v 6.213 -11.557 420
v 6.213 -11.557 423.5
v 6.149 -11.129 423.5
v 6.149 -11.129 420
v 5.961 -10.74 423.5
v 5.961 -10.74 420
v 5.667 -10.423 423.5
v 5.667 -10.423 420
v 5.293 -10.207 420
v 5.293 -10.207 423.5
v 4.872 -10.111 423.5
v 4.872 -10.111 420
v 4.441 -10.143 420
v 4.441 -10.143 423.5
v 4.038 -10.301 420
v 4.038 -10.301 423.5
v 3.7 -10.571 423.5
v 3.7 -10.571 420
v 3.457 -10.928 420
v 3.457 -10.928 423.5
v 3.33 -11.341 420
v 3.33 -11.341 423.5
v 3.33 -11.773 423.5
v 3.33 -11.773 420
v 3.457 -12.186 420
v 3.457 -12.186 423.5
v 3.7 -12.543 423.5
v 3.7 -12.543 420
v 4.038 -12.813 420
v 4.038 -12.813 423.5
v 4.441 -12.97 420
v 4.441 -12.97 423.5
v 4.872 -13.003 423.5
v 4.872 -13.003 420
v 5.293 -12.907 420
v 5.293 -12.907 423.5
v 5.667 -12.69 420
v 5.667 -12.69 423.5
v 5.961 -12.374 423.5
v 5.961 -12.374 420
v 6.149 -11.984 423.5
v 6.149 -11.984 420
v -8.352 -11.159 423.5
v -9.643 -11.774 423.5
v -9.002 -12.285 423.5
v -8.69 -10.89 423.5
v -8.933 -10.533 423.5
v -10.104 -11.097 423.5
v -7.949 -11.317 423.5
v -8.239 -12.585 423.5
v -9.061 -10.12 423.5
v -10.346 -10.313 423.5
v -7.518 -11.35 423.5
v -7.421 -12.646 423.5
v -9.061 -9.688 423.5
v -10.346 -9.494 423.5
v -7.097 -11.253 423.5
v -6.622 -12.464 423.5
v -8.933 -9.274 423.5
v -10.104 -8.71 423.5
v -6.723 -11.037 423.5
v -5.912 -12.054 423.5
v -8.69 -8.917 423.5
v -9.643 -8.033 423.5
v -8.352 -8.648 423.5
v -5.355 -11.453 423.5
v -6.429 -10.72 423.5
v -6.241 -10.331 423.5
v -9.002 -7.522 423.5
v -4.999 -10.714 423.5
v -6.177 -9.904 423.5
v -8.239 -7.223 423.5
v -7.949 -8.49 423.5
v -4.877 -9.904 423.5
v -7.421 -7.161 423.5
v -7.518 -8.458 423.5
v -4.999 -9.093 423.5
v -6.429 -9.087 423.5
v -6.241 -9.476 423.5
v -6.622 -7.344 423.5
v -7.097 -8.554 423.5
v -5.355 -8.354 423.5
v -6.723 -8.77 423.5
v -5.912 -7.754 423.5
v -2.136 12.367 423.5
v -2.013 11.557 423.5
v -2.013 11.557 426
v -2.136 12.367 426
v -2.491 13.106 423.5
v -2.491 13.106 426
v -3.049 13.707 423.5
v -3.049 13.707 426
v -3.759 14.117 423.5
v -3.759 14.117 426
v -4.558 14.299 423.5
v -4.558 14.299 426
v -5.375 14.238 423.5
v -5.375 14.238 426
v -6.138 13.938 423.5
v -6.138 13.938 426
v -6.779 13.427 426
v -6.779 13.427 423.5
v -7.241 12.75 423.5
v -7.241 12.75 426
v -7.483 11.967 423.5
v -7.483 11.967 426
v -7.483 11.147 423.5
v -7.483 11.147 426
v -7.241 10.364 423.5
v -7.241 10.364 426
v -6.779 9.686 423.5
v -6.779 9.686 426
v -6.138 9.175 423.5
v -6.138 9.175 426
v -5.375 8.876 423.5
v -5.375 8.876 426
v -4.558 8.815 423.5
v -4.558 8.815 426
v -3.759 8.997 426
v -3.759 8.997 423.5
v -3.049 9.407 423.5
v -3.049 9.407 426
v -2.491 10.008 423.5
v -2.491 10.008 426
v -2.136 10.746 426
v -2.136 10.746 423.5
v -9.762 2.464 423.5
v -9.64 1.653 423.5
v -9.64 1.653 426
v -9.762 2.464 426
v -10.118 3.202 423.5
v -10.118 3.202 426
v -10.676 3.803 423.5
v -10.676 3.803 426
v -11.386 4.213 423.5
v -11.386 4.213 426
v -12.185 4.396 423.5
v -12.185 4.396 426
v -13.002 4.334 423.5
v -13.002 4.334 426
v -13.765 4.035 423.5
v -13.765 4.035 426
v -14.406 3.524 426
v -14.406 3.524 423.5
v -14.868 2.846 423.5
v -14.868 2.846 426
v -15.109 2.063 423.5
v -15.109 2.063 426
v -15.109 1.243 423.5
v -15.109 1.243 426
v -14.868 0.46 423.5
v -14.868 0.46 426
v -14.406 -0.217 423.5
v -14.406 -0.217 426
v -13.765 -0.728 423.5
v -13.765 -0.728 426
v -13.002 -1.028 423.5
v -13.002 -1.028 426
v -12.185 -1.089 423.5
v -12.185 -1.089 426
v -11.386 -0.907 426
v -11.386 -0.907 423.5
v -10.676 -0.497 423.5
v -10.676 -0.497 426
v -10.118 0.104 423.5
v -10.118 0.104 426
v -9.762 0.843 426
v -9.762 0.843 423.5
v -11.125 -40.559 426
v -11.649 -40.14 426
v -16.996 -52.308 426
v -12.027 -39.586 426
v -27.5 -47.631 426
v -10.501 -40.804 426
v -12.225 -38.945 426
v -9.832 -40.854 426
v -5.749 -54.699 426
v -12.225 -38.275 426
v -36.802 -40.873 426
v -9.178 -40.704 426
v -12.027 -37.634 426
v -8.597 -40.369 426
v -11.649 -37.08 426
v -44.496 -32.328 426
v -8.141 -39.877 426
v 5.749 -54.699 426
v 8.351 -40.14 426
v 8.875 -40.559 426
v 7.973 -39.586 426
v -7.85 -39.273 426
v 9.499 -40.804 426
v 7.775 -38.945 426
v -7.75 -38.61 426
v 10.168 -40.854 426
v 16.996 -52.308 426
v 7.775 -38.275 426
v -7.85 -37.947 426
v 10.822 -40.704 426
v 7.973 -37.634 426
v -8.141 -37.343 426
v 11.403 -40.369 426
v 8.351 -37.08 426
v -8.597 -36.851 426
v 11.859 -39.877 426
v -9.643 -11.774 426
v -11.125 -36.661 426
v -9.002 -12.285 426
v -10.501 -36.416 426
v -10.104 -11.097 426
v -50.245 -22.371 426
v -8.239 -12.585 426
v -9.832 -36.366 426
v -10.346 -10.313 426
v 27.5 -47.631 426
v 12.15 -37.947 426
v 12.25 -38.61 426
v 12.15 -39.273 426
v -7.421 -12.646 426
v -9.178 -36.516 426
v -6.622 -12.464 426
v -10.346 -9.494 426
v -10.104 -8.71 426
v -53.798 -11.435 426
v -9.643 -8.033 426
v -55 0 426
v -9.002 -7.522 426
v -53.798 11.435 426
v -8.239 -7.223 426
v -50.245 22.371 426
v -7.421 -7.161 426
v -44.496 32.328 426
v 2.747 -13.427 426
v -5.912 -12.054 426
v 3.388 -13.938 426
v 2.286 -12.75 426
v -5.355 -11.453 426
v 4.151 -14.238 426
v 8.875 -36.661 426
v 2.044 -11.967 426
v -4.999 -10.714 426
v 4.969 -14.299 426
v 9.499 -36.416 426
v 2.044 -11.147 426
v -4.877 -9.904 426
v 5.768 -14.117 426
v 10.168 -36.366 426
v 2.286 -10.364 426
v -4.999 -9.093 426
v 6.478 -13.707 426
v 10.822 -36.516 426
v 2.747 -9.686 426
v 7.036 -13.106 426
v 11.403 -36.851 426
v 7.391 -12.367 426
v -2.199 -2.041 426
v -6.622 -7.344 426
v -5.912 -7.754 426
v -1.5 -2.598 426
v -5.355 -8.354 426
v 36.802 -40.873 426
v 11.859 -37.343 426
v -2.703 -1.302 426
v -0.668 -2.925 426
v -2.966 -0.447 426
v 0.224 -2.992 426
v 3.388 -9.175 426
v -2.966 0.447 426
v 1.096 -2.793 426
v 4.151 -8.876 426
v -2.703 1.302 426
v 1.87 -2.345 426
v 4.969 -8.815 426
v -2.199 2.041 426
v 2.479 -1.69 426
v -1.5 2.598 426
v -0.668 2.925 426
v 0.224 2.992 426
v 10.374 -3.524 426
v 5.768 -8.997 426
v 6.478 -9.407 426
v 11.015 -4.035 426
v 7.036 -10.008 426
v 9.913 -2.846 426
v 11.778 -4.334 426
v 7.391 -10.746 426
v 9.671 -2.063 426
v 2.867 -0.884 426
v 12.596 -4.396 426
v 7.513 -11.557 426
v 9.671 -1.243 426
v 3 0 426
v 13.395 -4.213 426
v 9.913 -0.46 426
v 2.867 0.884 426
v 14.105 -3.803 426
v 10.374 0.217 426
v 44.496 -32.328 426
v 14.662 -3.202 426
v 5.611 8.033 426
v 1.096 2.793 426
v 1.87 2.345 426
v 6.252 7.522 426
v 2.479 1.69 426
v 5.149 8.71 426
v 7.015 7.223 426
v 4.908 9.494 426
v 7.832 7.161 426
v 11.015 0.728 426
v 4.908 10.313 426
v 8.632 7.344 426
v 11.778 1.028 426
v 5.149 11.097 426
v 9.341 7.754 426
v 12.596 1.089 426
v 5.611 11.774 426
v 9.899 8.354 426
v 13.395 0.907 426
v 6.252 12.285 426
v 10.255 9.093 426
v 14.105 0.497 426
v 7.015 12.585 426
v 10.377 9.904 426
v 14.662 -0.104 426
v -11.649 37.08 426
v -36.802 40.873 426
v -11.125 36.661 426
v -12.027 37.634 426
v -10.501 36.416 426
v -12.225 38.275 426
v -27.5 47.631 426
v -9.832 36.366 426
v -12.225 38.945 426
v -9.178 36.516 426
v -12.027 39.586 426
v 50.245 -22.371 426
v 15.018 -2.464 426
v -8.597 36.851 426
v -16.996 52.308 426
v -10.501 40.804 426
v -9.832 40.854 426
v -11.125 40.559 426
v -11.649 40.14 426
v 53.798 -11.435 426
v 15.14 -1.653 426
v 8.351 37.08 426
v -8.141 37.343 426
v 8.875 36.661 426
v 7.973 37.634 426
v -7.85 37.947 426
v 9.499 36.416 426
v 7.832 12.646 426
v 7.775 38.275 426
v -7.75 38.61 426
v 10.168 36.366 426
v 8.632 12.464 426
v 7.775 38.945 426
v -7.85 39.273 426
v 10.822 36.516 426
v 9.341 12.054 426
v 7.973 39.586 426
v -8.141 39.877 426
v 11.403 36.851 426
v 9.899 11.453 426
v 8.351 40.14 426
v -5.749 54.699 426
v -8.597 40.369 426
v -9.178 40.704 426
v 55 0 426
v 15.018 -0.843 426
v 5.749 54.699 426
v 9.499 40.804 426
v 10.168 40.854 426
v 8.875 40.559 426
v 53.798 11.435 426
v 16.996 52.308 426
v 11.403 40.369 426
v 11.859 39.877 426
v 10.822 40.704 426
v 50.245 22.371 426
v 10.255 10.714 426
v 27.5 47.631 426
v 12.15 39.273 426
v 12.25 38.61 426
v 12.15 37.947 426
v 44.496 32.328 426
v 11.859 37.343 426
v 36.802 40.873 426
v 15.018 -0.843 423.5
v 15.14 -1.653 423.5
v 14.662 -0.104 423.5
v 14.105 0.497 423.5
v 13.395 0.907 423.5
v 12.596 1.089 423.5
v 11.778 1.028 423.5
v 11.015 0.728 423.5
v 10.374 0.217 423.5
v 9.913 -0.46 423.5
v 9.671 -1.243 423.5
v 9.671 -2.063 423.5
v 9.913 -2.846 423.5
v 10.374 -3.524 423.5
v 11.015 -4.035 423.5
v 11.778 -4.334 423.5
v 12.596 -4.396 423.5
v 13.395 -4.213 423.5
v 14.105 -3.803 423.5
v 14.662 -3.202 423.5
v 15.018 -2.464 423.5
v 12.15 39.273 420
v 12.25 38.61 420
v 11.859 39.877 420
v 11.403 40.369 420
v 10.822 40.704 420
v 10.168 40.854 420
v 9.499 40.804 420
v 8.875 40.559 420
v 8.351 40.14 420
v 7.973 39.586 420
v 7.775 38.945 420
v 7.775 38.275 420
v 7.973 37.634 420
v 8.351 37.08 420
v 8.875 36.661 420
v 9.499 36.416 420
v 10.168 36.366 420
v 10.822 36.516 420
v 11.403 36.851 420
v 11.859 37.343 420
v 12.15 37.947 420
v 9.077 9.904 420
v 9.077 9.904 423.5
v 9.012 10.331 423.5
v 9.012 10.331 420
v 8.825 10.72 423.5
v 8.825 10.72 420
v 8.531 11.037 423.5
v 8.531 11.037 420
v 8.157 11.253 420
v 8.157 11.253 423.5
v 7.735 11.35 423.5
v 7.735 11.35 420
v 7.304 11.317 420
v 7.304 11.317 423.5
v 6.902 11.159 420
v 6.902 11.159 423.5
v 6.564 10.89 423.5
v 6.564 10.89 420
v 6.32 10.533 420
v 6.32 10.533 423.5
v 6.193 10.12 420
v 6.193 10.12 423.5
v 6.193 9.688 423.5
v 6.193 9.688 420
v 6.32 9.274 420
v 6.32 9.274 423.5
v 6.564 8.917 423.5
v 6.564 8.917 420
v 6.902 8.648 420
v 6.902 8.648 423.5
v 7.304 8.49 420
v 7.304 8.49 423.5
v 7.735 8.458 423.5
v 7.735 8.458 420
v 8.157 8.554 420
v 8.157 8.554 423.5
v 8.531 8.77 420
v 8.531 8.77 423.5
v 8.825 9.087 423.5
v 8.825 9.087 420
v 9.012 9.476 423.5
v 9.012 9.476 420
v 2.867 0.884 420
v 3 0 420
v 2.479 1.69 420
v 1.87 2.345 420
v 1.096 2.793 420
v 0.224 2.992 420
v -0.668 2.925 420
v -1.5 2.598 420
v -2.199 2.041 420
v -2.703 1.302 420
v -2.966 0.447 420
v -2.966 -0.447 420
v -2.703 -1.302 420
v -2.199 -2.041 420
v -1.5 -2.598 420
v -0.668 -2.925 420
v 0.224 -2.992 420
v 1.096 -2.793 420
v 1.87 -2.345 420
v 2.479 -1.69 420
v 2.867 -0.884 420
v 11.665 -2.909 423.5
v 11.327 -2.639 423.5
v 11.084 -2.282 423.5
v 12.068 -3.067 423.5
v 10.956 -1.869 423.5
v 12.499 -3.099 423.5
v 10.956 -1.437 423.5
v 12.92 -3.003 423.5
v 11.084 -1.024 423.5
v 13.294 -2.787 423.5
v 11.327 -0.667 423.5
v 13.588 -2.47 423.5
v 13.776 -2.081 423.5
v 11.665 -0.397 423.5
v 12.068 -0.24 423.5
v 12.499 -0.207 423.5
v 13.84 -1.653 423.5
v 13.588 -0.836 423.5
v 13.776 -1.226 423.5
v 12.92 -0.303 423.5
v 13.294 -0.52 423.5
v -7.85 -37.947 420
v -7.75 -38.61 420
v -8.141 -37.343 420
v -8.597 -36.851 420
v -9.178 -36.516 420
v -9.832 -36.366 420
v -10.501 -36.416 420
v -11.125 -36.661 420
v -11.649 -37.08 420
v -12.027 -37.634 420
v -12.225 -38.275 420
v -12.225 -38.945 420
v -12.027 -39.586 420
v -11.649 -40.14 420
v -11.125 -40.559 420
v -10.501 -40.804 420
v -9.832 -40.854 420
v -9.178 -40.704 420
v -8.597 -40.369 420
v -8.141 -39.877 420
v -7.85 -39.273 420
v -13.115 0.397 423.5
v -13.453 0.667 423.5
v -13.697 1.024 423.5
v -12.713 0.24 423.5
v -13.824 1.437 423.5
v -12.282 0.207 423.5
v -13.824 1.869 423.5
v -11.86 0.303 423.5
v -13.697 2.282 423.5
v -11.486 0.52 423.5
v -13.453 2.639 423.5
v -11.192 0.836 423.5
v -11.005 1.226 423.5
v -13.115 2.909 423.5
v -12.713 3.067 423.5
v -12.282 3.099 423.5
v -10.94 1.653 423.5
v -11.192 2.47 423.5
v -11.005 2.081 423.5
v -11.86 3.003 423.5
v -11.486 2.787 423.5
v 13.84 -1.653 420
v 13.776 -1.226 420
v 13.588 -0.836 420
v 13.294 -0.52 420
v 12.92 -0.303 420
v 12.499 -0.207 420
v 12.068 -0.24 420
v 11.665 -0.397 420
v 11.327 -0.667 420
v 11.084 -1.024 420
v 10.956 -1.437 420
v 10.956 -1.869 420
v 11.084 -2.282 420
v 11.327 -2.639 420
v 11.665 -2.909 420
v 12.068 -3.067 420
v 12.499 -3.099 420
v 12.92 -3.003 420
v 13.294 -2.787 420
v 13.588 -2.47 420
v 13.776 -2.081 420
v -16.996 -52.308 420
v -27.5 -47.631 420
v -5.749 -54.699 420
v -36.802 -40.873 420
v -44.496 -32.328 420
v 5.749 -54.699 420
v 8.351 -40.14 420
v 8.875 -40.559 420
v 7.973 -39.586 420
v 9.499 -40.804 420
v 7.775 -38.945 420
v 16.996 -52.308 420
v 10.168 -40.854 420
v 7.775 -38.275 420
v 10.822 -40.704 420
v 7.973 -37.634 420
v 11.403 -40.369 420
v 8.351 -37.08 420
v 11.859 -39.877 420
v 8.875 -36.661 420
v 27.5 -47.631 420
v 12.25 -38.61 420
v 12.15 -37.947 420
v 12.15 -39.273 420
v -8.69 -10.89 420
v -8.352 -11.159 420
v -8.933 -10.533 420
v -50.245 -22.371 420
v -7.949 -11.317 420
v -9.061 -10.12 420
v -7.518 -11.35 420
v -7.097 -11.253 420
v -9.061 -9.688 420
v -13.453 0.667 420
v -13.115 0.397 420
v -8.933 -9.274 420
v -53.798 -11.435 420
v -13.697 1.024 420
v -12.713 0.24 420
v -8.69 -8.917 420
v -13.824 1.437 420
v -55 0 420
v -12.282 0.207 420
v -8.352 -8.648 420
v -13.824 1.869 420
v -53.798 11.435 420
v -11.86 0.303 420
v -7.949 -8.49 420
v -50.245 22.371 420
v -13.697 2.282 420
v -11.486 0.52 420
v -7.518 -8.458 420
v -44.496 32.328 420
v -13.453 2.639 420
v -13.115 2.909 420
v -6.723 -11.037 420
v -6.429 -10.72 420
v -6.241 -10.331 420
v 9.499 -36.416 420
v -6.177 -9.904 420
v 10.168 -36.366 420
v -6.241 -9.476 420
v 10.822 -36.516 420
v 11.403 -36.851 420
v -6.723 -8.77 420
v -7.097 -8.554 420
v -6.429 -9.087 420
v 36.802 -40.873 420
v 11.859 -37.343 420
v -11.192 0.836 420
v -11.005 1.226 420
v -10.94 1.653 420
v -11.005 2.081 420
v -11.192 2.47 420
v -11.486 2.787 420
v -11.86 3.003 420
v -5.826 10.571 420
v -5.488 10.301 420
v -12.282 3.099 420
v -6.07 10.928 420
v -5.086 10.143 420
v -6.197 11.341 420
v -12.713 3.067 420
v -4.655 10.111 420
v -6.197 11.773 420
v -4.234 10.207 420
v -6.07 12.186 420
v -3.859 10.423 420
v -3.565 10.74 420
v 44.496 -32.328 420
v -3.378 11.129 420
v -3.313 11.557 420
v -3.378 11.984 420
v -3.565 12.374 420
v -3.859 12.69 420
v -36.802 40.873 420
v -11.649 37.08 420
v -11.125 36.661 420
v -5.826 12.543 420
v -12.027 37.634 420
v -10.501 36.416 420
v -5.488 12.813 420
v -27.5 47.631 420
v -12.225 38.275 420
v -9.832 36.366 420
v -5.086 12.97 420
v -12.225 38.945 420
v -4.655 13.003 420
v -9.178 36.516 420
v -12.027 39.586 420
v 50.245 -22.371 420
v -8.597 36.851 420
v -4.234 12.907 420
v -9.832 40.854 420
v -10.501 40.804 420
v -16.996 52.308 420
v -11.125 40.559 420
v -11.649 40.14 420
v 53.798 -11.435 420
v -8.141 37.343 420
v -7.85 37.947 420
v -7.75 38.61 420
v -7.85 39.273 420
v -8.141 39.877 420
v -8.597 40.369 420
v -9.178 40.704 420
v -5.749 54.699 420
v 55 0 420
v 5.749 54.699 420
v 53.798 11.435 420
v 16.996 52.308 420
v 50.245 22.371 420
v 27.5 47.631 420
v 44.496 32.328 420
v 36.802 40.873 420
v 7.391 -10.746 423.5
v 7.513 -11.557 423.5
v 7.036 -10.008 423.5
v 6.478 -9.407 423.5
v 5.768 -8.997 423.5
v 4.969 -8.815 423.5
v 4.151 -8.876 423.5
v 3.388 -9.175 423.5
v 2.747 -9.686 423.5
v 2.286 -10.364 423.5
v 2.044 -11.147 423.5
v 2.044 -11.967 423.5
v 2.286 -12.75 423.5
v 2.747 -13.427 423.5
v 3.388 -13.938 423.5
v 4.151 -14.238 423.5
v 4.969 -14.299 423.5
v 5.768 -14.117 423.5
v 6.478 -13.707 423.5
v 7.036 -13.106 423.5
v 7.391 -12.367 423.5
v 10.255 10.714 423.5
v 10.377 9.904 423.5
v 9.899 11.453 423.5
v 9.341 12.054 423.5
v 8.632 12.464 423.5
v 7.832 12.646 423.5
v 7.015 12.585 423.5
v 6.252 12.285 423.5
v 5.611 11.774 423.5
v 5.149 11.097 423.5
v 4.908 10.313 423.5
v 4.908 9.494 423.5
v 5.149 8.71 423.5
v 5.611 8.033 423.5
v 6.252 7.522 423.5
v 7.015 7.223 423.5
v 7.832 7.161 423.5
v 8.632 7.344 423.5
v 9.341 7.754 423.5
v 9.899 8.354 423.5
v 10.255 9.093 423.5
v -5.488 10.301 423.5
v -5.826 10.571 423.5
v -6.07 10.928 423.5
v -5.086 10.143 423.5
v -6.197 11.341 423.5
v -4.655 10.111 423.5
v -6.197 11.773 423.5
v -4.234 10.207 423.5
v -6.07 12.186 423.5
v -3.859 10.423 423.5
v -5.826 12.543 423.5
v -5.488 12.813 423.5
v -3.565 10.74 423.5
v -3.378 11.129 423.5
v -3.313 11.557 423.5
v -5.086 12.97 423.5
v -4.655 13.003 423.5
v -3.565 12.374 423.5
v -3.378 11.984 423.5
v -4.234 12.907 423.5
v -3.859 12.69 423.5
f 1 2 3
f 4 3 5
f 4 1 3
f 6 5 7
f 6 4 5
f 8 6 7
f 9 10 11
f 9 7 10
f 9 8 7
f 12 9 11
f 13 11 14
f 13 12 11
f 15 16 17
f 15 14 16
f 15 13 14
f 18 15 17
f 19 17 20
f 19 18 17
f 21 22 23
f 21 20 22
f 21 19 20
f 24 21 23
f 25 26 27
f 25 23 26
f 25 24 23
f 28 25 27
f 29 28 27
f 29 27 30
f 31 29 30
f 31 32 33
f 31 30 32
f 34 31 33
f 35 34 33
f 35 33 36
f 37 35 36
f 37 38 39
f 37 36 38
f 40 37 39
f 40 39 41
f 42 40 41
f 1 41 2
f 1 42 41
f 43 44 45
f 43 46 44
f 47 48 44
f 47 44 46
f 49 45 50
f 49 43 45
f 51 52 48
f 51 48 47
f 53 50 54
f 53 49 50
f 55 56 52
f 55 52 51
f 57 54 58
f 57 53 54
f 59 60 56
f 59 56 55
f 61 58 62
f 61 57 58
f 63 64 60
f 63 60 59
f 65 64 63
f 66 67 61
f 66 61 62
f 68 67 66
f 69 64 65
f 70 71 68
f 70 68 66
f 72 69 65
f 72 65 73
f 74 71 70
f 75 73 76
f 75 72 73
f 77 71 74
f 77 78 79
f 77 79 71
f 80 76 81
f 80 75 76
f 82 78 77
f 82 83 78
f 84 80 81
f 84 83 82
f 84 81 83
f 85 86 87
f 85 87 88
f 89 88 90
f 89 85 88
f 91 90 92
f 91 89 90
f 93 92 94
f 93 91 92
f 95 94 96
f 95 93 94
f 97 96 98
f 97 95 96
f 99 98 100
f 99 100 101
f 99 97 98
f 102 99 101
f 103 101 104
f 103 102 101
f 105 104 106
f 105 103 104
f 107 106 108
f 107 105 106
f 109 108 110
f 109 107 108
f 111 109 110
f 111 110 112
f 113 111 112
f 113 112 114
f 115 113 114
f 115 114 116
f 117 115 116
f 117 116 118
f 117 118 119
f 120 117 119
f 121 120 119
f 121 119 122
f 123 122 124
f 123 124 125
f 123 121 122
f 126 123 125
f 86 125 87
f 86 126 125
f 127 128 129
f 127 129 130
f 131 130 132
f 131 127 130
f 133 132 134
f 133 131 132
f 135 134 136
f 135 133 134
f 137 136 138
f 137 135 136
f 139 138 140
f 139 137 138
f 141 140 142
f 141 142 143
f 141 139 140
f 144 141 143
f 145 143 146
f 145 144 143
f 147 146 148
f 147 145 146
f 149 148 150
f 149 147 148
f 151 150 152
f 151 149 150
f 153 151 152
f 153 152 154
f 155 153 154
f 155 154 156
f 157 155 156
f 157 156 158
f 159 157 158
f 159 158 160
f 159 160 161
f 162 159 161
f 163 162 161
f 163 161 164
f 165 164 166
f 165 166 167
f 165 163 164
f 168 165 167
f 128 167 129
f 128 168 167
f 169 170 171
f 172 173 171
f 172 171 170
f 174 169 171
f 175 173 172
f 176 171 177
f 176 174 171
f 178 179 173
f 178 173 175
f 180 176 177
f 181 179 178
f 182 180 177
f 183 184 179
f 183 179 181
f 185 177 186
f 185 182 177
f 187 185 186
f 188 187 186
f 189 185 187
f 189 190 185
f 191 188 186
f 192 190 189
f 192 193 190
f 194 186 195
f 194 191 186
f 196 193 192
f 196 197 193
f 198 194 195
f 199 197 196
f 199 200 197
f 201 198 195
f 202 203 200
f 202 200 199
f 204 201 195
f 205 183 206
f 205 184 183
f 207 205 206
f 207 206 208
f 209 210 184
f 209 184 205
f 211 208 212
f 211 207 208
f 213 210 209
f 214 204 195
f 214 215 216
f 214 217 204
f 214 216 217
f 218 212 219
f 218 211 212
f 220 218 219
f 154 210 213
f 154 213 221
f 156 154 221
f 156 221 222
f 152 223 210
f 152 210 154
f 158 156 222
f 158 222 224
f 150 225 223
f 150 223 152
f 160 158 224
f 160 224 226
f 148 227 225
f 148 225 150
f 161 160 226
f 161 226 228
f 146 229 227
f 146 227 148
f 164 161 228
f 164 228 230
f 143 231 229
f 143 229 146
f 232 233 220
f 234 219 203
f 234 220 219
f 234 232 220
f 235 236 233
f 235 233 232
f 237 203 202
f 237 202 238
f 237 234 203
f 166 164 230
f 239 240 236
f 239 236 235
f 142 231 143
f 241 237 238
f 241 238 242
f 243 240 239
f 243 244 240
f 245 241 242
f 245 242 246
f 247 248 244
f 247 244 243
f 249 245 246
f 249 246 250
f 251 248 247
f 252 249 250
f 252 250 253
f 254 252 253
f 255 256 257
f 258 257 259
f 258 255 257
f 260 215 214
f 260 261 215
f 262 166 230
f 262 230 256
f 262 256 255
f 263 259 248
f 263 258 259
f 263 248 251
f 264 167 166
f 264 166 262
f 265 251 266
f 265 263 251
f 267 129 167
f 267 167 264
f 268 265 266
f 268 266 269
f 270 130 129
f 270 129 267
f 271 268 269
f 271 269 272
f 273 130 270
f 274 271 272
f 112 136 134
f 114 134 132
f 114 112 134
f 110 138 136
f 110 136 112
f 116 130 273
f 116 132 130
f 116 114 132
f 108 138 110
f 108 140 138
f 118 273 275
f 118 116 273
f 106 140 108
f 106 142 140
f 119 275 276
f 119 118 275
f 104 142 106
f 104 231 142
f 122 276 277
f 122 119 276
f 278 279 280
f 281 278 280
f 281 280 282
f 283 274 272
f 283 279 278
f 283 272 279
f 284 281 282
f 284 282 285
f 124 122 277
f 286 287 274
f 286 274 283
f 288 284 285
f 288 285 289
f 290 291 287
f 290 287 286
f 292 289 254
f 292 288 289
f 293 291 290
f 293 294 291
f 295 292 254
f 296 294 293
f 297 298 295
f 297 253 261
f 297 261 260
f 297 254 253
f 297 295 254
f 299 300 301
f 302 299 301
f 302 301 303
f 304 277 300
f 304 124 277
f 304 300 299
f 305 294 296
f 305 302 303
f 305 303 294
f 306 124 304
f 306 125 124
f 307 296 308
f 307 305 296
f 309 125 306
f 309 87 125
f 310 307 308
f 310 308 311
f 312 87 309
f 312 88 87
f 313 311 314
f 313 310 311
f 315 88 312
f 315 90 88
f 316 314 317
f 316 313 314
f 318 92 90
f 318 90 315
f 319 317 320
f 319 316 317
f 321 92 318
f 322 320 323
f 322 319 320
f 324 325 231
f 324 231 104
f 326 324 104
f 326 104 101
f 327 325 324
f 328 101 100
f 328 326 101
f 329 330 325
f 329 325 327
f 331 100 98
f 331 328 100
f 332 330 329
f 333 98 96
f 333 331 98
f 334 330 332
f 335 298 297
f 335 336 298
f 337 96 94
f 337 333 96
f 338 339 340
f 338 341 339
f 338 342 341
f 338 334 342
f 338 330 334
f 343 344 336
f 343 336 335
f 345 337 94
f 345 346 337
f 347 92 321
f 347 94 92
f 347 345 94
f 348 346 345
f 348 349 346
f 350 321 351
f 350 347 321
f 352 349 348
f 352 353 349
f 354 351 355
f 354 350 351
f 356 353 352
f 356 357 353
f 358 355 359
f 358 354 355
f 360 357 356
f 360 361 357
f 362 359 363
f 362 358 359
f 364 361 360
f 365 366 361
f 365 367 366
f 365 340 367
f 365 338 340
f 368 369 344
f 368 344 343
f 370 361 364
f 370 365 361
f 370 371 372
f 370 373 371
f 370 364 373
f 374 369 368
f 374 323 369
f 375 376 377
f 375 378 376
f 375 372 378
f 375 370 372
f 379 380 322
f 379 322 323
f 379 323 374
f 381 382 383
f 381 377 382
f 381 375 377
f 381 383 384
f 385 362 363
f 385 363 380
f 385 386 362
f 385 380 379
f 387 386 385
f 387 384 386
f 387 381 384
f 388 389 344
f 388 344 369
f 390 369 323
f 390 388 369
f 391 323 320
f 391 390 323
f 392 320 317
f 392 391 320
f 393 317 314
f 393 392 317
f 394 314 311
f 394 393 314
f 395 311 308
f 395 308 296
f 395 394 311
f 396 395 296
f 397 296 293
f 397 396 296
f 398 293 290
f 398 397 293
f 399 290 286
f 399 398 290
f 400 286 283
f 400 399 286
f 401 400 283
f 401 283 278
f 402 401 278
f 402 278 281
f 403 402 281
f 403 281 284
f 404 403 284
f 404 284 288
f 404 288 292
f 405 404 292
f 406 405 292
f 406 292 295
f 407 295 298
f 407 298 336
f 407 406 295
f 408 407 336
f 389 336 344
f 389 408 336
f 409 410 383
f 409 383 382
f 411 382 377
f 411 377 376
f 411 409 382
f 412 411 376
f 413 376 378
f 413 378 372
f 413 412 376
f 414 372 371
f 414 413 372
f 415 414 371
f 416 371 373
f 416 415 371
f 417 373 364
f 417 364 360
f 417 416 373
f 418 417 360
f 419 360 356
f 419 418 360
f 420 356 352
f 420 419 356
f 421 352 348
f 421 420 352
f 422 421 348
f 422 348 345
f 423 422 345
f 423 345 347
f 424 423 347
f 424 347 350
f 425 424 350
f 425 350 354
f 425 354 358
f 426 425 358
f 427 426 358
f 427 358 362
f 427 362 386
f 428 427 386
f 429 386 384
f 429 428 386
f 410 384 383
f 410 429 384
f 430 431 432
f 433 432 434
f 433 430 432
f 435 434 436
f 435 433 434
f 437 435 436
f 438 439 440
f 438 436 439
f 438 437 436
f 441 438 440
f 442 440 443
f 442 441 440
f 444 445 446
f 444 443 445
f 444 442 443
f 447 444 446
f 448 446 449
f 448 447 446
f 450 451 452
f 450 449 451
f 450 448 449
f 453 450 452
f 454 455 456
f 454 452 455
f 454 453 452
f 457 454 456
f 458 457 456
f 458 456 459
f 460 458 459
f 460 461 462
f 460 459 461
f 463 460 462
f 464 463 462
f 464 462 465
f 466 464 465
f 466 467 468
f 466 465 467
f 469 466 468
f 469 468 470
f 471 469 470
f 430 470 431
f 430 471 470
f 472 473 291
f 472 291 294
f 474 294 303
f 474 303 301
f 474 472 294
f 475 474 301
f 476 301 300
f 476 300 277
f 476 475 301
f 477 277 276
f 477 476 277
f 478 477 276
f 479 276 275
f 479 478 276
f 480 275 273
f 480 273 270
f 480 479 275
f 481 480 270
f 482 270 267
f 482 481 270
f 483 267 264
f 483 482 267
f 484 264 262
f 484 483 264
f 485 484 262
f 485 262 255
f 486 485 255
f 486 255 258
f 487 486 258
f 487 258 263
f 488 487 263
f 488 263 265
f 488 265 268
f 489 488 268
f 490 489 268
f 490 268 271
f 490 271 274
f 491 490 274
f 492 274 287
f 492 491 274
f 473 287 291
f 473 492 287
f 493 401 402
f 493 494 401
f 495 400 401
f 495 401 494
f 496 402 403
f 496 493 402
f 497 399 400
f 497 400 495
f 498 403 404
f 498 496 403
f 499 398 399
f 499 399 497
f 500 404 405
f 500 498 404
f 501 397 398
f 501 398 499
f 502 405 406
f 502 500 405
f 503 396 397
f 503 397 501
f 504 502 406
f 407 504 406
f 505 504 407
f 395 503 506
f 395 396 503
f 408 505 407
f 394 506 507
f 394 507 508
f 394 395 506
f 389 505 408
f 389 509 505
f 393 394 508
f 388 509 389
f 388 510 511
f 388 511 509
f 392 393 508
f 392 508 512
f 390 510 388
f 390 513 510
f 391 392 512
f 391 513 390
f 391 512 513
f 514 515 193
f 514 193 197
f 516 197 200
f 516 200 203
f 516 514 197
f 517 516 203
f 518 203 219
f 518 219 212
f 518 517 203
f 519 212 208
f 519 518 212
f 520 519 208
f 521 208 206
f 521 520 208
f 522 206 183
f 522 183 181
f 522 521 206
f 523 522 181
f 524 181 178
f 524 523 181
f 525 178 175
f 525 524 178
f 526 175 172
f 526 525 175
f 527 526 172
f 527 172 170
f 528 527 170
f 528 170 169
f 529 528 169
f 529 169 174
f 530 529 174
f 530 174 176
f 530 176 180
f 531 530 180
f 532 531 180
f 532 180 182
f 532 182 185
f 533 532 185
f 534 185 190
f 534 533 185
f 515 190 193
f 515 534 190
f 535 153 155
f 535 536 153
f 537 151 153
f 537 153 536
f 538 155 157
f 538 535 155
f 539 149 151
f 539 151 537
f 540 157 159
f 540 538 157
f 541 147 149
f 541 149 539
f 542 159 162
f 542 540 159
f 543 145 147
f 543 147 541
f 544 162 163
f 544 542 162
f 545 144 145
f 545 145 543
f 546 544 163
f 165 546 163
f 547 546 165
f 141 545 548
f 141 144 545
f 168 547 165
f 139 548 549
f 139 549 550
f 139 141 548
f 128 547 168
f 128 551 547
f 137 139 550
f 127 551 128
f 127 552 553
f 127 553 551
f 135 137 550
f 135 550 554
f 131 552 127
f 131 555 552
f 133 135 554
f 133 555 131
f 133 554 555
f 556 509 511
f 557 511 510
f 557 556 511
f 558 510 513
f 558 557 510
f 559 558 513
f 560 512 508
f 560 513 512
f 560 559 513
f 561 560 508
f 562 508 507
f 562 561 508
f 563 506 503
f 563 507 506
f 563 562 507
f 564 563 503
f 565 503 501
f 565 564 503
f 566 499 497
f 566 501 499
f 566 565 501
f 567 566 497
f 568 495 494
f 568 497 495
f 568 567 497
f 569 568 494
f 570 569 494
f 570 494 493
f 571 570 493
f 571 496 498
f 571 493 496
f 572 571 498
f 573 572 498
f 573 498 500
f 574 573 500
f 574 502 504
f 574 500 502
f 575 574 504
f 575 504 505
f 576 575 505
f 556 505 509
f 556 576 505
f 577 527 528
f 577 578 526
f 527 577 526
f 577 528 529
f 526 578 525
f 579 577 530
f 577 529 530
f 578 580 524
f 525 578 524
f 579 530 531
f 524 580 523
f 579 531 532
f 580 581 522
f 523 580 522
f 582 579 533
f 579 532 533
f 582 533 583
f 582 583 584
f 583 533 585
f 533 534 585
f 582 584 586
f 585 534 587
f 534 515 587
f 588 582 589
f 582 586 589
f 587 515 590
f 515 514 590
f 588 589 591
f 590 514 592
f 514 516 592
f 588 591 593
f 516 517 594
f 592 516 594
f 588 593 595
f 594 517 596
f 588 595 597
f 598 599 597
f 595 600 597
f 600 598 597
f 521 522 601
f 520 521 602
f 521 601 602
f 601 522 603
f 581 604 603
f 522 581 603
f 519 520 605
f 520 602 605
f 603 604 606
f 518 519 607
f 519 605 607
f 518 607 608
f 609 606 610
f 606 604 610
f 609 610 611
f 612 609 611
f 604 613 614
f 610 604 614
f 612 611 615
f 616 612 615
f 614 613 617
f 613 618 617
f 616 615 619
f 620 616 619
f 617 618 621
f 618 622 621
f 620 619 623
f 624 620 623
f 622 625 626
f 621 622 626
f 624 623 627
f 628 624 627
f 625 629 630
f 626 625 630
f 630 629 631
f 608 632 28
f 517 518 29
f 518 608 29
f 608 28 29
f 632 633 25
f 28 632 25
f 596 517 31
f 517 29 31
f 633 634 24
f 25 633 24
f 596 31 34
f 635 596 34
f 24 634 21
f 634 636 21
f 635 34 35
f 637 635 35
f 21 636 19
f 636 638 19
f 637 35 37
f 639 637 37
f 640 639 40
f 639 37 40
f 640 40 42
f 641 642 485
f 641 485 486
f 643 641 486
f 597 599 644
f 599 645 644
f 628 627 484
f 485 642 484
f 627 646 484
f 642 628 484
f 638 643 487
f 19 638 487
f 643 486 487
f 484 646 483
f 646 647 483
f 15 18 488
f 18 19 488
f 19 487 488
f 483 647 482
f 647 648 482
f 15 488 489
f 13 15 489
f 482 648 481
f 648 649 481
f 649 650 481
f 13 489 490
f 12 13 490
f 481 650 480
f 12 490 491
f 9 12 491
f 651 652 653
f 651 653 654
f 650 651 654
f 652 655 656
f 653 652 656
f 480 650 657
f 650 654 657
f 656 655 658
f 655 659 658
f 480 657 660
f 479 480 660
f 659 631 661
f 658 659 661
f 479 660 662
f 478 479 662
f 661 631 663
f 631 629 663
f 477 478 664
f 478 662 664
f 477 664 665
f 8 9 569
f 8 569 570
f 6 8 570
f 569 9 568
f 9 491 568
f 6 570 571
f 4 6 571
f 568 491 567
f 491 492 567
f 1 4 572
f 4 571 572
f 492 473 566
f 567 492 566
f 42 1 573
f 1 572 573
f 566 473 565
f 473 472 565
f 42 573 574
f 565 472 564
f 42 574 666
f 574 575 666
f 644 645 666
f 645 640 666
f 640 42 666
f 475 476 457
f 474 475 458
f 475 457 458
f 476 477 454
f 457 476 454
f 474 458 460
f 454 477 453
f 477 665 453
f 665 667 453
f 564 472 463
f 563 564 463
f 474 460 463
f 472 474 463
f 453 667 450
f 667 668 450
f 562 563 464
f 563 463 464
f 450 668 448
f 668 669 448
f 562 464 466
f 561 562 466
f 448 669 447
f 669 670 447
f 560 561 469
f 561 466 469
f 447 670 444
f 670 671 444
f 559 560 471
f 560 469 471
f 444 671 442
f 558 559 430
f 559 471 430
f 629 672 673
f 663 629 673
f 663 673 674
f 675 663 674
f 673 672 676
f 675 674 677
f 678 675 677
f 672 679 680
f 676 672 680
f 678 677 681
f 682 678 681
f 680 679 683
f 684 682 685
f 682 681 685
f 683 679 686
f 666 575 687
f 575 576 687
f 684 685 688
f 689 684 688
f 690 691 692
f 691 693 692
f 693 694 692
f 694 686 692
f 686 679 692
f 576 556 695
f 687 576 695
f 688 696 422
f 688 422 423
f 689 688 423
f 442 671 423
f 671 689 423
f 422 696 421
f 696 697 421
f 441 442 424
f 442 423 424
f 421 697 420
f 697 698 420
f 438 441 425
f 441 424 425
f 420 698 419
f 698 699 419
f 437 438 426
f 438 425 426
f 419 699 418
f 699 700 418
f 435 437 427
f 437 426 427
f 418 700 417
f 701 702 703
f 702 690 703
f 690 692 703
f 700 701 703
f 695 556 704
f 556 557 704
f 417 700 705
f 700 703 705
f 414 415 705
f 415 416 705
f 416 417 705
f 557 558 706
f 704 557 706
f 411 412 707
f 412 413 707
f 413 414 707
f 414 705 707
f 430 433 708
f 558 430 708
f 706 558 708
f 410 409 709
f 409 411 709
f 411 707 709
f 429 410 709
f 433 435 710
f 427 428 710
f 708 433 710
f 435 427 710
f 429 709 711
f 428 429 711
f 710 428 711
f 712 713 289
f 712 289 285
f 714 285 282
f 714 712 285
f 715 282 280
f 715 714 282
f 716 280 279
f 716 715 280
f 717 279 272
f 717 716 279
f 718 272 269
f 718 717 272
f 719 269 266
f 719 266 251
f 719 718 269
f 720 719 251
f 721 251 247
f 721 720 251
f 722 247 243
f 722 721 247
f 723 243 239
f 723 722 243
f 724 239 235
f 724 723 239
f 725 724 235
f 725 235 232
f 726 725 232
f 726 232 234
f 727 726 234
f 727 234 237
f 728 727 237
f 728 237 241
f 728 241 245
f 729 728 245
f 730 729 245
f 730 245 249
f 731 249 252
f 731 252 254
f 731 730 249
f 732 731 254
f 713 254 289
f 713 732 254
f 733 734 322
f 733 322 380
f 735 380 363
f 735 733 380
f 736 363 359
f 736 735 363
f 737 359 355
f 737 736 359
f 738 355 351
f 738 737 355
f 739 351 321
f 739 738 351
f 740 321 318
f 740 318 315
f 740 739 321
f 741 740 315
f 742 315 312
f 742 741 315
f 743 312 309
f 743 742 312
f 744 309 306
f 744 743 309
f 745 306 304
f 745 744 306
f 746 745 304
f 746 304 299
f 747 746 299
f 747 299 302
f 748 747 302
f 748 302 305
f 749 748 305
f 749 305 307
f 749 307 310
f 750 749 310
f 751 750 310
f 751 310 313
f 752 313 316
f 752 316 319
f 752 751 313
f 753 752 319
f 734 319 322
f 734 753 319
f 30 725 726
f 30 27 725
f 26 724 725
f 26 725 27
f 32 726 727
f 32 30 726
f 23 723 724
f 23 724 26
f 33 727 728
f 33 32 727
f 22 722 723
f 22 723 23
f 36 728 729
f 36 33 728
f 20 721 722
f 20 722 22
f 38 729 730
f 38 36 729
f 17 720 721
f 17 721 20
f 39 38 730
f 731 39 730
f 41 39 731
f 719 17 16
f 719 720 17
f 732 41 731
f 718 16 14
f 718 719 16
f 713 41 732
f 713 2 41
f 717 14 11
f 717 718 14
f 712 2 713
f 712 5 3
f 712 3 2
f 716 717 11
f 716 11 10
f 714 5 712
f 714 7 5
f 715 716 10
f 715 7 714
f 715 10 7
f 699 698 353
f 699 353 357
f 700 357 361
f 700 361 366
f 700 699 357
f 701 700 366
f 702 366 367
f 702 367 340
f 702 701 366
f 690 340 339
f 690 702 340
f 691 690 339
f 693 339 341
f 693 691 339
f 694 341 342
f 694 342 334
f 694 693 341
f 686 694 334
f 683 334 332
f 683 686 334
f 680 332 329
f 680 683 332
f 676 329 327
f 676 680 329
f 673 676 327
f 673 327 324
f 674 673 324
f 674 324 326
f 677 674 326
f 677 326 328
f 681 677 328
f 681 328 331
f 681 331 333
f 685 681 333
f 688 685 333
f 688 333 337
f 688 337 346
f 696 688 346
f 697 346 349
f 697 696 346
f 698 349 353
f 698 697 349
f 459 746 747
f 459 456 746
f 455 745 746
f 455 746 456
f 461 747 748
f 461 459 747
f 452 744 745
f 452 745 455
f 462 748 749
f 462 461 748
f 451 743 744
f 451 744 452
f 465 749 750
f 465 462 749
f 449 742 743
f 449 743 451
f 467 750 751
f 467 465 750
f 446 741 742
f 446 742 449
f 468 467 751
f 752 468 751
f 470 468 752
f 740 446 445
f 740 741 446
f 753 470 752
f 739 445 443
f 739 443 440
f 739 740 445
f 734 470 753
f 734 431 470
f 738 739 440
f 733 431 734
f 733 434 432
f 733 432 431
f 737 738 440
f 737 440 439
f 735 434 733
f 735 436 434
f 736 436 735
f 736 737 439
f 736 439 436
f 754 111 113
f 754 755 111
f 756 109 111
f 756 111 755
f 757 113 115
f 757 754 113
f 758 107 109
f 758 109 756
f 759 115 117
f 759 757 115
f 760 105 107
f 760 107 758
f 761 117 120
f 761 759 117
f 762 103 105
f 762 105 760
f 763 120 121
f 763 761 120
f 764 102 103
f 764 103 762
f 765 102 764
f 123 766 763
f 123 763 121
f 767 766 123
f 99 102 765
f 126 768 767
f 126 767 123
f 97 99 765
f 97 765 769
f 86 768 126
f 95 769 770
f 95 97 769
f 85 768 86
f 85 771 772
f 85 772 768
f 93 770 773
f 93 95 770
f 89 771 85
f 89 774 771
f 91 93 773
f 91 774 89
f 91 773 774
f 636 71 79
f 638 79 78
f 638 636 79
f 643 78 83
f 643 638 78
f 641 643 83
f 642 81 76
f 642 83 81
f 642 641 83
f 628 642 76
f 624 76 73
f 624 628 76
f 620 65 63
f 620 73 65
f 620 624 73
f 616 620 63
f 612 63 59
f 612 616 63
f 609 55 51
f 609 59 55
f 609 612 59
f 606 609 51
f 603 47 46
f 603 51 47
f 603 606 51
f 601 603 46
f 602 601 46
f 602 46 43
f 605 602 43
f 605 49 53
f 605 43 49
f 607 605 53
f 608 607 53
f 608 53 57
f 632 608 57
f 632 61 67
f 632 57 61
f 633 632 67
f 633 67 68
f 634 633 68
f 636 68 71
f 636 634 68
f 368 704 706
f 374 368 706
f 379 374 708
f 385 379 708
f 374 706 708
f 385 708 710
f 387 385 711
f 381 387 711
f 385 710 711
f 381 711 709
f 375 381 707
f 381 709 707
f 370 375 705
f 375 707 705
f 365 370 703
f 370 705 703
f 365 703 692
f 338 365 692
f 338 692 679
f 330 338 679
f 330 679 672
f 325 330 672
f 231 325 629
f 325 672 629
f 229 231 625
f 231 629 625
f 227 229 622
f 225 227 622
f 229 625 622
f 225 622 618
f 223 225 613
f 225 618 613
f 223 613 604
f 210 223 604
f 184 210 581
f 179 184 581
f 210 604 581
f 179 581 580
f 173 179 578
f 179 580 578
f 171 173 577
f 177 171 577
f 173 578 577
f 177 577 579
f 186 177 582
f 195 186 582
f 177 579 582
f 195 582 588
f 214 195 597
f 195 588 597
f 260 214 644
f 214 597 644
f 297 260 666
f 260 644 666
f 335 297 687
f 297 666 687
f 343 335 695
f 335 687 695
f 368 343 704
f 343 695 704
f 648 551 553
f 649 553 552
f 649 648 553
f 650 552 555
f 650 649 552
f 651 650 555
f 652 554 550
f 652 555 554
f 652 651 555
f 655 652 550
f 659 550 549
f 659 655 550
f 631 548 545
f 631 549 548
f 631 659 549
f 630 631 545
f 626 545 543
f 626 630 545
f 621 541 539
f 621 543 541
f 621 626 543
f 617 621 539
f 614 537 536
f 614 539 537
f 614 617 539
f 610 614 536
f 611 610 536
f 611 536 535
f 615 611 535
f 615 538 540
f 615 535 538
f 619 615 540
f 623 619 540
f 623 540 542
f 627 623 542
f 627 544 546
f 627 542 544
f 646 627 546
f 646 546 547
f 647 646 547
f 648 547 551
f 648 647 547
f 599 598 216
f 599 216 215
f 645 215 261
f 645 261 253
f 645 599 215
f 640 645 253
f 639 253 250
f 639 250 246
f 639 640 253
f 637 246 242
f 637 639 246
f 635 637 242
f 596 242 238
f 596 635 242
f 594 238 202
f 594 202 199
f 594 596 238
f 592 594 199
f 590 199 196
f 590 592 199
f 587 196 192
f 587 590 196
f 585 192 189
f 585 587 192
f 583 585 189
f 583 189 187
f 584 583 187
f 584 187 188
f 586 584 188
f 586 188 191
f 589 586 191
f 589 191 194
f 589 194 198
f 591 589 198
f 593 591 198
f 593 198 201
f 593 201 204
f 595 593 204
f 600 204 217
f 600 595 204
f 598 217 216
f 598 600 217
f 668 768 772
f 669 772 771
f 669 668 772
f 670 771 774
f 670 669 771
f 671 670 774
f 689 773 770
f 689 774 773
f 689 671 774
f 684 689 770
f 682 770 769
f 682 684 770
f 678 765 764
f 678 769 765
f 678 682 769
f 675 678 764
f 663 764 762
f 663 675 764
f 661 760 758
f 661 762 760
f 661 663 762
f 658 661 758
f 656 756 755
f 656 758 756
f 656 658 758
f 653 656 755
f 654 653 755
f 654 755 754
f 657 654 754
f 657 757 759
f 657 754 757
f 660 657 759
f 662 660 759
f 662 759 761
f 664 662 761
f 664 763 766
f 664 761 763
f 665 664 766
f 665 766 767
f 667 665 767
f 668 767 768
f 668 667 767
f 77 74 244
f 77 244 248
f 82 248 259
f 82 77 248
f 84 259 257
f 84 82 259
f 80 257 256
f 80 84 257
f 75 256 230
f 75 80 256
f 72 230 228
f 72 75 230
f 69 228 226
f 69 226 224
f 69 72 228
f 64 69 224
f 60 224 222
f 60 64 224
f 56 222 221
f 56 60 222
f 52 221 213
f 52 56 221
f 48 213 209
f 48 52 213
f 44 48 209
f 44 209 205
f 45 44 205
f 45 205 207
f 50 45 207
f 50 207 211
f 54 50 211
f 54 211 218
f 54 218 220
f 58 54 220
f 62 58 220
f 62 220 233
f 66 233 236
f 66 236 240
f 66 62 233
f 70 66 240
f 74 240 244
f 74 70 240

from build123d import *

# Parameters (mm, degrees)
DISCO_START                  = 420
SK_DISCO_R                   = 55
DISCO_DEPTH                  = 6
PASANTES_M2_5_ROTOR_J4_START = 420
SK_PASANTES_M2_5_ROTOR_J4_R  = 1.45
PASANTES_M2_5_ROTOR_J4_DEPTH = 6
CAJAS_M2_5_START             = 423.5
SK_CAJAS_M2_5_R              = 2.75
CAJAS_M2_5_DEPTH             = 2.5
PASO_CABLE_START             = 420
SK_PASO_CABLE_R              = 3
PASO_CABLE_DEPTH             = 6
PASANTES_M4_ANGULOS_START    = 420
SK_PASANTES_M4_ANGULOS_R     = 2.25
PASANTES_M4_ANGULOS_DEPTH    = 6


with BuildPart() as part:
    # Sk_Disco → Disco (new body)
    with BuildSketch(Plane.XY.offset(DISCO_START)):
        Circle(SK_DISCO_R)
    extrude(amount=DISCO_DEPTH)

    # Sk_Pasantes_M2-5_rotor_J4 → Pasantes_M2-5_rotor_J4 (cut)
    with BuildSketch(Plane.XY.offset(PASANTES_M2_5_ROTOR_J4_START)):
        with Locations((12.390194253, -1.653204878)):
            Circle(SK_PASANTES_M2_5_ROTOR_J4_R)
        with Locations((7.626814549, 9.903620542)):
            Circle(SK_PASANTES_M2_5_ROTOR_J4_R)
        with Locations((-4.763379704, 11.55682542)):
            Circle(SK_PASANTES_M2_5_ROTOR_J4_R)
        with Locations((-12.390194253, 1.653204878)):
            Circle(SK_PASANTES_M2_5_ROTOR_J4_R)
        with Locations((-7.626814549, -9.903620542)):
            Circle(SK_PASANTES_M2_5_ROTOR_J4_R)
        with Locations((4.763379704, -11.55682542)):
            Circle(SK_PASANTES_M2_5_ROTOR_J4_R)
    extrude(amount=PASANTES_M2_5_ROTOR_J4_DEPTH, mode=Mode.SUBTRACT)

    # Sk_Cajas_M2-5 → Cajas_M2-5 (cut)
    with BuildSketch(Plane.XY.offset(CAJAS_M2_5_START)):
        with Locations((12.390194253, -1.653204878)):
            Circle(SK_CAJAS_M2_5_R)
        with Locations((7.626814549, 9.903620542)):
            Circle(SK_CAJAS_M2_5_R)
        with Locations((-4.763379704, 11.55682542)):
            Circle(SK_CAJAS_M2_5_R)
        with Locations((-12.390194253, 1.653204878)):
            Circle(SK_CAJAS_M2_5_R)
        with Locations((-7.626814549, -9.903620542)):
            Circle(SK_CAJAS_M2_5_R)
        with Locations((4.763379704, -11.55682542)):
            Circle(SK_CAJAS_M2_5_R)
    extrude(amount=CAJAS_M2_5_DEPTH, mode=Mode.SUBTRACT)

    # Sk_Paso_cable → Paso_cable (cut)
    with BuildSketch(Plane.XY.offset(PASO_CABLE_START)):
        Circle(SK_PASO_CABLE_R)
    extrude(amount=PASO_CABLE_DEPTH, mode=Mode.SUBTRACT)

    # Sk_Pasantes_M4_angulos → Pasantes_M4_angulos (cut)
    with BuildSketch(Plane.XY.offset(PASANTES_M4_ANGULOS_START)):
        with Locations((-10, -38.61)):
            Circle(SK_PASANTES_M4_ANGULOS_R)
        with Locations((-10, 38.61)):
            Circle(SK_PASANTES_M4_ANGULOS_R)
        with Locations((10, -38.61)):
            Circle(SK_PASANTES_M4_ANGULOS_R)
        with Locations((10, 38.61)):
            Circle(SK_PASANTES_M4_ANGULOS_R)
    extrude(amount=PASANTES_M4_ANGULOS_DEPTH, mode=Mode.SUBTRACT)


solid = part.part
